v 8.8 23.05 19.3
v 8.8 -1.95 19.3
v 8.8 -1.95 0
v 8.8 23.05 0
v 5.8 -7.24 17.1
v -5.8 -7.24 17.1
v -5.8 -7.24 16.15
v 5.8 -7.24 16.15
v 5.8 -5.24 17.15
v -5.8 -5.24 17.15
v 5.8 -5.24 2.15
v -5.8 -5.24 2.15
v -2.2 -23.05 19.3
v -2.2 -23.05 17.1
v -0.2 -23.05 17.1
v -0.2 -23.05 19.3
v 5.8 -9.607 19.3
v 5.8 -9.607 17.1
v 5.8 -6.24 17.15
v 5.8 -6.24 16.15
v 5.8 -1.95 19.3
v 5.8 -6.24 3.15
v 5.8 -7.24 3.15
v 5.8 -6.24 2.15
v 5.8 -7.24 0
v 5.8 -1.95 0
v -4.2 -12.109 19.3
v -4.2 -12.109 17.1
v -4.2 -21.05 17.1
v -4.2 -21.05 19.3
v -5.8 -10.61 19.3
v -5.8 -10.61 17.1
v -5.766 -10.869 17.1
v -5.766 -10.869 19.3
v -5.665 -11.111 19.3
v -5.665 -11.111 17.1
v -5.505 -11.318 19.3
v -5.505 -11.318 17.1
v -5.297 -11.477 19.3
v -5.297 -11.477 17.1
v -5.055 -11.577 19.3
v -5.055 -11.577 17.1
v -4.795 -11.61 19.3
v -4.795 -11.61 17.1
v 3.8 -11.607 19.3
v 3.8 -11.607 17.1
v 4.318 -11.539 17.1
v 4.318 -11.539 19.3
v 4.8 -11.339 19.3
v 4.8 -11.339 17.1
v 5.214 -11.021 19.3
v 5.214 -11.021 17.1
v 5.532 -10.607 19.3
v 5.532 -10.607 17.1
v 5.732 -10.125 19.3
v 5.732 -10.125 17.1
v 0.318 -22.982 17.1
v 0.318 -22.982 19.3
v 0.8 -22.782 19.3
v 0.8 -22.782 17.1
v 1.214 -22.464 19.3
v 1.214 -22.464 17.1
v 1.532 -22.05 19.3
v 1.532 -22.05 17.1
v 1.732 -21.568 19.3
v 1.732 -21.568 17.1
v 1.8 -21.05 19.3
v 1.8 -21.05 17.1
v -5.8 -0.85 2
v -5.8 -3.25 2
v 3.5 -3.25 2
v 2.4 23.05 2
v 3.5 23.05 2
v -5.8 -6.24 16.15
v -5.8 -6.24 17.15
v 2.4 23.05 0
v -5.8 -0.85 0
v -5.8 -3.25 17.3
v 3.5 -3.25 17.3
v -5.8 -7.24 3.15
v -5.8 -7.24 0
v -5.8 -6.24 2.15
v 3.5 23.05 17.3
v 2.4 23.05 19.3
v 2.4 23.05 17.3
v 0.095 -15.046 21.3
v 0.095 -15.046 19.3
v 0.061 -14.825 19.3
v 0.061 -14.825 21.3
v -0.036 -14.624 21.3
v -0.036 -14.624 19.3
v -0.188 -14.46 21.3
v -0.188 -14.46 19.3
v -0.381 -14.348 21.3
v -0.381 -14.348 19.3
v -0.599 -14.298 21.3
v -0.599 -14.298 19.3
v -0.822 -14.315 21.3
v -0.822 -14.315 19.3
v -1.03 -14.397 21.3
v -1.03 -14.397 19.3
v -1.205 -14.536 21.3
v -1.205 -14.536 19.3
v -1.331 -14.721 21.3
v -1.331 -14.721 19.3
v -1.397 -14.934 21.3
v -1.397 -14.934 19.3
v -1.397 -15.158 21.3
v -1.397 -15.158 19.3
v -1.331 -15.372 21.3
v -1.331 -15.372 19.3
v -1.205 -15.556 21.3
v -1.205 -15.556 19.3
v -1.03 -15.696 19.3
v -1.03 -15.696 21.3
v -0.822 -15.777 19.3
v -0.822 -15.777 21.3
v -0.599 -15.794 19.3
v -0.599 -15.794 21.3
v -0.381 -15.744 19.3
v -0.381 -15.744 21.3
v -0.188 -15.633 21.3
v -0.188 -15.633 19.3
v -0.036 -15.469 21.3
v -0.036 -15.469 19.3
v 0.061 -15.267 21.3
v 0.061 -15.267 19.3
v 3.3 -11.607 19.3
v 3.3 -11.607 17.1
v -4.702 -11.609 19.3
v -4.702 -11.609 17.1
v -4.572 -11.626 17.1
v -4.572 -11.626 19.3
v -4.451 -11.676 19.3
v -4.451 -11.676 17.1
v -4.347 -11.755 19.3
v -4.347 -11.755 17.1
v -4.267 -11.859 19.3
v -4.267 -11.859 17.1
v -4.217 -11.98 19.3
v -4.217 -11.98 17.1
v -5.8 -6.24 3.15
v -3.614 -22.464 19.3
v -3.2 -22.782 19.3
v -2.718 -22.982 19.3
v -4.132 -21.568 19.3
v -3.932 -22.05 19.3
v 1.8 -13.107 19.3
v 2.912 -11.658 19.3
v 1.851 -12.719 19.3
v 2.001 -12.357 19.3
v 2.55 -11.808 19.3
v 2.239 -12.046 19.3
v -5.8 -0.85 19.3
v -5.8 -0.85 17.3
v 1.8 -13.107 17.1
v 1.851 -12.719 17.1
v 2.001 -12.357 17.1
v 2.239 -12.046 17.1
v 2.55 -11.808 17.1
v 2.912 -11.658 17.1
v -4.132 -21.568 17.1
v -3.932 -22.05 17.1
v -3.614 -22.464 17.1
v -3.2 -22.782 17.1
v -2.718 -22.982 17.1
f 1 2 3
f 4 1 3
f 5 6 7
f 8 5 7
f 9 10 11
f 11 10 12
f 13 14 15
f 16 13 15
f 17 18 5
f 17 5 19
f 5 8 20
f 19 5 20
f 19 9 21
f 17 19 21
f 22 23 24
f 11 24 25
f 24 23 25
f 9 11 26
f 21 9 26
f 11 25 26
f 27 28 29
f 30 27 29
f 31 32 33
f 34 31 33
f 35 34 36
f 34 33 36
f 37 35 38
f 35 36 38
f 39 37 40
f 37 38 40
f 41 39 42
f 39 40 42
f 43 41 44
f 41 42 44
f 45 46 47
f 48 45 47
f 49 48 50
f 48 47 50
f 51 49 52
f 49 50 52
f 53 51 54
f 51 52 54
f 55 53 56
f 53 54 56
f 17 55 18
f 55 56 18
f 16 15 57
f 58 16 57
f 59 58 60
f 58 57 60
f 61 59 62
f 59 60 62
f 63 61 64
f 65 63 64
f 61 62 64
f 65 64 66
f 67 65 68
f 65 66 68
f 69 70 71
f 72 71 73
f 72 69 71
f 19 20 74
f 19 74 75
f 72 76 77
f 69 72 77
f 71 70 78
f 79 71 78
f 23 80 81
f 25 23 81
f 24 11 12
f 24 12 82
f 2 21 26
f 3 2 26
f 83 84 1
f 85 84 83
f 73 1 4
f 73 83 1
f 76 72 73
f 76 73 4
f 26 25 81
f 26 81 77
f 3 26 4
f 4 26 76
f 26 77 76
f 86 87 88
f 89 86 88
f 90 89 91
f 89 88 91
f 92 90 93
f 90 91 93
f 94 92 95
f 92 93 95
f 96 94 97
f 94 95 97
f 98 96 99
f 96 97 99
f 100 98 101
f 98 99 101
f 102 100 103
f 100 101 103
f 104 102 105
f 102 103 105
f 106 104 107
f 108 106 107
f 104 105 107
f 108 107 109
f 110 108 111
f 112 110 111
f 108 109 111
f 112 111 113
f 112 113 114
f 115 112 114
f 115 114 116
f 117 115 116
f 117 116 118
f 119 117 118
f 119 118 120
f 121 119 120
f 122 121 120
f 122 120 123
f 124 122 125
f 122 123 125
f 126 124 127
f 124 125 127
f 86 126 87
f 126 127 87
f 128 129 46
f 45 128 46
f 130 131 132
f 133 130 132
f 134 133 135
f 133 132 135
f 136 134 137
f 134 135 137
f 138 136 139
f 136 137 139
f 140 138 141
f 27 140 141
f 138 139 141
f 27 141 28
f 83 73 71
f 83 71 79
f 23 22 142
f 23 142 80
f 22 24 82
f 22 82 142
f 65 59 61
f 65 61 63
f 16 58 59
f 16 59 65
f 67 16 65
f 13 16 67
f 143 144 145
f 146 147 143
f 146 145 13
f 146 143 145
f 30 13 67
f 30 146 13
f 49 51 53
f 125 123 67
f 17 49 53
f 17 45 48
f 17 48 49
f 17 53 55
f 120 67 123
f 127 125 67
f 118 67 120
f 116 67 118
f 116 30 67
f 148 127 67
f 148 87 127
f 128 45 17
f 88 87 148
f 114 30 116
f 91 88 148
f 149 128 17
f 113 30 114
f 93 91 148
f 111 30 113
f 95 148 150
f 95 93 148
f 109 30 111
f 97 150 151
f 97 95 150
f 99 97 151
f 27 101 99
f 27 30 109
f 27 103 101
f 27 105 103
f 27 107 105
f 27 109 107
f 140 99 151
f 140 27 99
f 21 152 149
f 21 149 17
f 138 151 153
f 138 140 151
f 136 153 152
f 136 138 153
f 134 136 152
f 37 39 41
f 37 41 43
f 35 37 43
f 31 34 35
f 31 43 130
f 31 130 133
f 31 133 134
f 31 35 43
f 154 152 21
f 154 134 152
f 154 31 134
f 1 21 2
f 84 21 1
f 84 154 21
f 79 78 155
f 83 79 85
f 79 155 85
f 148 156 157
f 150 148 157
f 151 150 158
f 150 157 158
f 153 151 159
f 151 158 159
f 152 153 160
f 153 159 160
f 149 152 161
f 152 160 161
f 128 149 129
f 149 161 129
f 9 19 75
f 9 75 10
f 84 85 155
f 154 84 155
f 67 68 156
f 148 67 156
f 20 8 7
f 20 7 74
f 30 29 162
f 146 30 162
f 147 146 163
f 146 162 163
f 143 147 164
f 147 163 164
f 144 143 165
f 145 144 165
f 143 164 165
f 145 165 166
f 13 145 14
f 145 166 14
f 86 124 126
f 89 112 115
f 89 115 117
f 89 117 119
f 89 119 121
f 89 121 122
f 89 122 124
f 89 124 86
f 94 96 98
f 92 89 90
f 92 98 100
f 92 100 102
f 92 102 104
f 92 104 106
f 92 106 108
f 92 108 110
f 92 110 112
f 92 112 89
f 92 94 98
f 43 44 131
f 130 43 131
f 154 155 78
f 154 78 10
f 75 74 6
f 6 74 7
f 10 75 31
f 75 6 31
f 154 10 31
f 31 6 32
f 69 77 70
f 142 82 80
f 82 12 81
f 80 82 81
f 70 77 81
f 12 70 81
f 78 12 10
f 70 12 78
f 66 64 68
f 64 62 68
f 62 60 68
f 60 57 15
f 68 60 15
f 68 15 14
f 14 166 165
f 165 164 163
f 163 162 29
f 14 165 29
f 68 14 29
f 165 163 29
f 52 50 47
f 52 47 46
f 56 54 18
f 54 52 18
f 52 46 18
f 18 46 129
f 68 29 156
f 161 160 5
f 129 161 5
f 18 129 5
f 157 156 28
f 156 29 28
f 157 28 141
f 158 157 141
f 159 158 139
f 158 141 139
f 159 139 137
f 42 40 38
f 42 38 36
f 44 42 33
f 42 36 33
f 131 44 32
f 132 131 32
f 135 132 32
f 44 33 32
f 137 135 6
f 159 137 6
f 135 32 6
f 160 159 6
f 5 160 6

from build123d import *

# Parameters (mm, degrees)
SALIENTE_EXTRUIR1_DEPTH = 19.3
CROQUIS2_W              = 15.3
CROQUIS2_H              = 26.3
CORTAR_EXTRUIR1_DEPTH   = 9.3
CORTAR_EXTRUIR2_DEPTH   = 12.3
CROQUIS6_R              = 0.75
SALIENTE_EXTRUIR2_DEPTH = 2
CROQUIS7_W              = 19.3
CROQUIS7_H              = 25
SALIENTE_EXTRUIR3_DEPTH = 3


with BuildPart() as part:
    # Croquis1 → Saliente-Extruir1 (new body)
    with BuildSketch(Plane.XY):
        with BuildLine():
            Line((5.8, 23.05), (2.4, 23.05))
            Line((2.4, 23.05), (-5.8, -0.85))
            Line((-5.8, -0.85), (-5.8, -10.609737321))
            ThreePointArc((-5.8, -10.609737321), (-5.505459406, -11.318487649), (-4.795345946, -11.609726491))
            Line((-4.795345946, -11.609726491), (-4.702327027, -11.609293571))
            ThreePointArc((-4.702327027, -11.609293571), (-4.347270297, -11.754912992), (-4.2, -12.109288156))
            Line((-4.2, -12.109288156), (-4.2, -21.05))
            ThreePointArc((-4.2, -21.05), (-3.614213562, -22.464213562), (-2.2, -23.05))
            Line((-2.2, -23.05), (-0.2, -23.05))
            ThreePointArc((-0.2, -23.05), (1.214213562, -22.464213562), (1.8, -21.05))
            Line((1.8, -21.05), (1.8, -13.106955688))
            ThreePointArc((1.8, -13.106955688), (2.239339828, -12.046295517), (3.3, -11.606955688))
            Line((3.3, -11.606955688), (3.8, -11.606955688))
            ThreePointArc((3.8, -11.606955688), (5.214213562, -11.021169251), (5.8, -9.606955688))
            Line((5.8, -9.606955688), (5.8, 23.05))
        make_face()
    extrude(amount=SALIENTE_EXTRUIR1_DEPTH)

    # Croquis2 → Cortar-Extruir1 (cut)
    with BuildSketch(Plane.ZY.offset(5.8)):
        with Locations((9.65, 9.9)):
            Rectangle(CROQUIS2_W, CROQUIS2_H)
    extrude(amount=-CORTAR_EXTRUIR1_DEPTH, mode=Mode.SUBTRACT)

    # Croquis4 → Cortar-Extruir2 (cut)
    with BuildSketch(Plane.ZY.offset(5.8)):
        Polygon((2.15, -5.239890457), (2.15, -6.239890457), (3.15, -6.239890457), (3.15, -7.239890457), (-0.05, -7.239890457), (-0.05, -23.239890457), (17.1, -23.239890457), (17.1, -7.239890457), (16.15, -7.239890457), (16.15, -6.239890457), (17.15, -6.239890457), (17.15, -5.239890457), align=None)
    extrude(amount=-CORTAR_EXTRUIR2_DEPTH, mode=Mode.SUBTRACT)

    # Croquis6 → Saliente-Extruir2 (add)
    with BuildSketch(Plane.XY.offset(19.3)):
        with Locations((-0.655214383, -15.046201441)):
            Circle(CROQUIS6_R)
    extrude(amount=SALIENTE_EXTRUIR2_DEPTH)

    # Croquis7 → Saliente-Extruir3 (add)
    with BuildSketch(Plane(origin=(5.8, 0, 0), x_dir=(0, 0, -1), z_dir=(1, 0, 0))):
        with Locations((-9.65, 10.55)):
            Rectangle(CROQUIS7_W, CROQUIS7_H)
    extrude(amount=SALIENTE_EXTRUIR3_DEPTH)


solid = part.part
